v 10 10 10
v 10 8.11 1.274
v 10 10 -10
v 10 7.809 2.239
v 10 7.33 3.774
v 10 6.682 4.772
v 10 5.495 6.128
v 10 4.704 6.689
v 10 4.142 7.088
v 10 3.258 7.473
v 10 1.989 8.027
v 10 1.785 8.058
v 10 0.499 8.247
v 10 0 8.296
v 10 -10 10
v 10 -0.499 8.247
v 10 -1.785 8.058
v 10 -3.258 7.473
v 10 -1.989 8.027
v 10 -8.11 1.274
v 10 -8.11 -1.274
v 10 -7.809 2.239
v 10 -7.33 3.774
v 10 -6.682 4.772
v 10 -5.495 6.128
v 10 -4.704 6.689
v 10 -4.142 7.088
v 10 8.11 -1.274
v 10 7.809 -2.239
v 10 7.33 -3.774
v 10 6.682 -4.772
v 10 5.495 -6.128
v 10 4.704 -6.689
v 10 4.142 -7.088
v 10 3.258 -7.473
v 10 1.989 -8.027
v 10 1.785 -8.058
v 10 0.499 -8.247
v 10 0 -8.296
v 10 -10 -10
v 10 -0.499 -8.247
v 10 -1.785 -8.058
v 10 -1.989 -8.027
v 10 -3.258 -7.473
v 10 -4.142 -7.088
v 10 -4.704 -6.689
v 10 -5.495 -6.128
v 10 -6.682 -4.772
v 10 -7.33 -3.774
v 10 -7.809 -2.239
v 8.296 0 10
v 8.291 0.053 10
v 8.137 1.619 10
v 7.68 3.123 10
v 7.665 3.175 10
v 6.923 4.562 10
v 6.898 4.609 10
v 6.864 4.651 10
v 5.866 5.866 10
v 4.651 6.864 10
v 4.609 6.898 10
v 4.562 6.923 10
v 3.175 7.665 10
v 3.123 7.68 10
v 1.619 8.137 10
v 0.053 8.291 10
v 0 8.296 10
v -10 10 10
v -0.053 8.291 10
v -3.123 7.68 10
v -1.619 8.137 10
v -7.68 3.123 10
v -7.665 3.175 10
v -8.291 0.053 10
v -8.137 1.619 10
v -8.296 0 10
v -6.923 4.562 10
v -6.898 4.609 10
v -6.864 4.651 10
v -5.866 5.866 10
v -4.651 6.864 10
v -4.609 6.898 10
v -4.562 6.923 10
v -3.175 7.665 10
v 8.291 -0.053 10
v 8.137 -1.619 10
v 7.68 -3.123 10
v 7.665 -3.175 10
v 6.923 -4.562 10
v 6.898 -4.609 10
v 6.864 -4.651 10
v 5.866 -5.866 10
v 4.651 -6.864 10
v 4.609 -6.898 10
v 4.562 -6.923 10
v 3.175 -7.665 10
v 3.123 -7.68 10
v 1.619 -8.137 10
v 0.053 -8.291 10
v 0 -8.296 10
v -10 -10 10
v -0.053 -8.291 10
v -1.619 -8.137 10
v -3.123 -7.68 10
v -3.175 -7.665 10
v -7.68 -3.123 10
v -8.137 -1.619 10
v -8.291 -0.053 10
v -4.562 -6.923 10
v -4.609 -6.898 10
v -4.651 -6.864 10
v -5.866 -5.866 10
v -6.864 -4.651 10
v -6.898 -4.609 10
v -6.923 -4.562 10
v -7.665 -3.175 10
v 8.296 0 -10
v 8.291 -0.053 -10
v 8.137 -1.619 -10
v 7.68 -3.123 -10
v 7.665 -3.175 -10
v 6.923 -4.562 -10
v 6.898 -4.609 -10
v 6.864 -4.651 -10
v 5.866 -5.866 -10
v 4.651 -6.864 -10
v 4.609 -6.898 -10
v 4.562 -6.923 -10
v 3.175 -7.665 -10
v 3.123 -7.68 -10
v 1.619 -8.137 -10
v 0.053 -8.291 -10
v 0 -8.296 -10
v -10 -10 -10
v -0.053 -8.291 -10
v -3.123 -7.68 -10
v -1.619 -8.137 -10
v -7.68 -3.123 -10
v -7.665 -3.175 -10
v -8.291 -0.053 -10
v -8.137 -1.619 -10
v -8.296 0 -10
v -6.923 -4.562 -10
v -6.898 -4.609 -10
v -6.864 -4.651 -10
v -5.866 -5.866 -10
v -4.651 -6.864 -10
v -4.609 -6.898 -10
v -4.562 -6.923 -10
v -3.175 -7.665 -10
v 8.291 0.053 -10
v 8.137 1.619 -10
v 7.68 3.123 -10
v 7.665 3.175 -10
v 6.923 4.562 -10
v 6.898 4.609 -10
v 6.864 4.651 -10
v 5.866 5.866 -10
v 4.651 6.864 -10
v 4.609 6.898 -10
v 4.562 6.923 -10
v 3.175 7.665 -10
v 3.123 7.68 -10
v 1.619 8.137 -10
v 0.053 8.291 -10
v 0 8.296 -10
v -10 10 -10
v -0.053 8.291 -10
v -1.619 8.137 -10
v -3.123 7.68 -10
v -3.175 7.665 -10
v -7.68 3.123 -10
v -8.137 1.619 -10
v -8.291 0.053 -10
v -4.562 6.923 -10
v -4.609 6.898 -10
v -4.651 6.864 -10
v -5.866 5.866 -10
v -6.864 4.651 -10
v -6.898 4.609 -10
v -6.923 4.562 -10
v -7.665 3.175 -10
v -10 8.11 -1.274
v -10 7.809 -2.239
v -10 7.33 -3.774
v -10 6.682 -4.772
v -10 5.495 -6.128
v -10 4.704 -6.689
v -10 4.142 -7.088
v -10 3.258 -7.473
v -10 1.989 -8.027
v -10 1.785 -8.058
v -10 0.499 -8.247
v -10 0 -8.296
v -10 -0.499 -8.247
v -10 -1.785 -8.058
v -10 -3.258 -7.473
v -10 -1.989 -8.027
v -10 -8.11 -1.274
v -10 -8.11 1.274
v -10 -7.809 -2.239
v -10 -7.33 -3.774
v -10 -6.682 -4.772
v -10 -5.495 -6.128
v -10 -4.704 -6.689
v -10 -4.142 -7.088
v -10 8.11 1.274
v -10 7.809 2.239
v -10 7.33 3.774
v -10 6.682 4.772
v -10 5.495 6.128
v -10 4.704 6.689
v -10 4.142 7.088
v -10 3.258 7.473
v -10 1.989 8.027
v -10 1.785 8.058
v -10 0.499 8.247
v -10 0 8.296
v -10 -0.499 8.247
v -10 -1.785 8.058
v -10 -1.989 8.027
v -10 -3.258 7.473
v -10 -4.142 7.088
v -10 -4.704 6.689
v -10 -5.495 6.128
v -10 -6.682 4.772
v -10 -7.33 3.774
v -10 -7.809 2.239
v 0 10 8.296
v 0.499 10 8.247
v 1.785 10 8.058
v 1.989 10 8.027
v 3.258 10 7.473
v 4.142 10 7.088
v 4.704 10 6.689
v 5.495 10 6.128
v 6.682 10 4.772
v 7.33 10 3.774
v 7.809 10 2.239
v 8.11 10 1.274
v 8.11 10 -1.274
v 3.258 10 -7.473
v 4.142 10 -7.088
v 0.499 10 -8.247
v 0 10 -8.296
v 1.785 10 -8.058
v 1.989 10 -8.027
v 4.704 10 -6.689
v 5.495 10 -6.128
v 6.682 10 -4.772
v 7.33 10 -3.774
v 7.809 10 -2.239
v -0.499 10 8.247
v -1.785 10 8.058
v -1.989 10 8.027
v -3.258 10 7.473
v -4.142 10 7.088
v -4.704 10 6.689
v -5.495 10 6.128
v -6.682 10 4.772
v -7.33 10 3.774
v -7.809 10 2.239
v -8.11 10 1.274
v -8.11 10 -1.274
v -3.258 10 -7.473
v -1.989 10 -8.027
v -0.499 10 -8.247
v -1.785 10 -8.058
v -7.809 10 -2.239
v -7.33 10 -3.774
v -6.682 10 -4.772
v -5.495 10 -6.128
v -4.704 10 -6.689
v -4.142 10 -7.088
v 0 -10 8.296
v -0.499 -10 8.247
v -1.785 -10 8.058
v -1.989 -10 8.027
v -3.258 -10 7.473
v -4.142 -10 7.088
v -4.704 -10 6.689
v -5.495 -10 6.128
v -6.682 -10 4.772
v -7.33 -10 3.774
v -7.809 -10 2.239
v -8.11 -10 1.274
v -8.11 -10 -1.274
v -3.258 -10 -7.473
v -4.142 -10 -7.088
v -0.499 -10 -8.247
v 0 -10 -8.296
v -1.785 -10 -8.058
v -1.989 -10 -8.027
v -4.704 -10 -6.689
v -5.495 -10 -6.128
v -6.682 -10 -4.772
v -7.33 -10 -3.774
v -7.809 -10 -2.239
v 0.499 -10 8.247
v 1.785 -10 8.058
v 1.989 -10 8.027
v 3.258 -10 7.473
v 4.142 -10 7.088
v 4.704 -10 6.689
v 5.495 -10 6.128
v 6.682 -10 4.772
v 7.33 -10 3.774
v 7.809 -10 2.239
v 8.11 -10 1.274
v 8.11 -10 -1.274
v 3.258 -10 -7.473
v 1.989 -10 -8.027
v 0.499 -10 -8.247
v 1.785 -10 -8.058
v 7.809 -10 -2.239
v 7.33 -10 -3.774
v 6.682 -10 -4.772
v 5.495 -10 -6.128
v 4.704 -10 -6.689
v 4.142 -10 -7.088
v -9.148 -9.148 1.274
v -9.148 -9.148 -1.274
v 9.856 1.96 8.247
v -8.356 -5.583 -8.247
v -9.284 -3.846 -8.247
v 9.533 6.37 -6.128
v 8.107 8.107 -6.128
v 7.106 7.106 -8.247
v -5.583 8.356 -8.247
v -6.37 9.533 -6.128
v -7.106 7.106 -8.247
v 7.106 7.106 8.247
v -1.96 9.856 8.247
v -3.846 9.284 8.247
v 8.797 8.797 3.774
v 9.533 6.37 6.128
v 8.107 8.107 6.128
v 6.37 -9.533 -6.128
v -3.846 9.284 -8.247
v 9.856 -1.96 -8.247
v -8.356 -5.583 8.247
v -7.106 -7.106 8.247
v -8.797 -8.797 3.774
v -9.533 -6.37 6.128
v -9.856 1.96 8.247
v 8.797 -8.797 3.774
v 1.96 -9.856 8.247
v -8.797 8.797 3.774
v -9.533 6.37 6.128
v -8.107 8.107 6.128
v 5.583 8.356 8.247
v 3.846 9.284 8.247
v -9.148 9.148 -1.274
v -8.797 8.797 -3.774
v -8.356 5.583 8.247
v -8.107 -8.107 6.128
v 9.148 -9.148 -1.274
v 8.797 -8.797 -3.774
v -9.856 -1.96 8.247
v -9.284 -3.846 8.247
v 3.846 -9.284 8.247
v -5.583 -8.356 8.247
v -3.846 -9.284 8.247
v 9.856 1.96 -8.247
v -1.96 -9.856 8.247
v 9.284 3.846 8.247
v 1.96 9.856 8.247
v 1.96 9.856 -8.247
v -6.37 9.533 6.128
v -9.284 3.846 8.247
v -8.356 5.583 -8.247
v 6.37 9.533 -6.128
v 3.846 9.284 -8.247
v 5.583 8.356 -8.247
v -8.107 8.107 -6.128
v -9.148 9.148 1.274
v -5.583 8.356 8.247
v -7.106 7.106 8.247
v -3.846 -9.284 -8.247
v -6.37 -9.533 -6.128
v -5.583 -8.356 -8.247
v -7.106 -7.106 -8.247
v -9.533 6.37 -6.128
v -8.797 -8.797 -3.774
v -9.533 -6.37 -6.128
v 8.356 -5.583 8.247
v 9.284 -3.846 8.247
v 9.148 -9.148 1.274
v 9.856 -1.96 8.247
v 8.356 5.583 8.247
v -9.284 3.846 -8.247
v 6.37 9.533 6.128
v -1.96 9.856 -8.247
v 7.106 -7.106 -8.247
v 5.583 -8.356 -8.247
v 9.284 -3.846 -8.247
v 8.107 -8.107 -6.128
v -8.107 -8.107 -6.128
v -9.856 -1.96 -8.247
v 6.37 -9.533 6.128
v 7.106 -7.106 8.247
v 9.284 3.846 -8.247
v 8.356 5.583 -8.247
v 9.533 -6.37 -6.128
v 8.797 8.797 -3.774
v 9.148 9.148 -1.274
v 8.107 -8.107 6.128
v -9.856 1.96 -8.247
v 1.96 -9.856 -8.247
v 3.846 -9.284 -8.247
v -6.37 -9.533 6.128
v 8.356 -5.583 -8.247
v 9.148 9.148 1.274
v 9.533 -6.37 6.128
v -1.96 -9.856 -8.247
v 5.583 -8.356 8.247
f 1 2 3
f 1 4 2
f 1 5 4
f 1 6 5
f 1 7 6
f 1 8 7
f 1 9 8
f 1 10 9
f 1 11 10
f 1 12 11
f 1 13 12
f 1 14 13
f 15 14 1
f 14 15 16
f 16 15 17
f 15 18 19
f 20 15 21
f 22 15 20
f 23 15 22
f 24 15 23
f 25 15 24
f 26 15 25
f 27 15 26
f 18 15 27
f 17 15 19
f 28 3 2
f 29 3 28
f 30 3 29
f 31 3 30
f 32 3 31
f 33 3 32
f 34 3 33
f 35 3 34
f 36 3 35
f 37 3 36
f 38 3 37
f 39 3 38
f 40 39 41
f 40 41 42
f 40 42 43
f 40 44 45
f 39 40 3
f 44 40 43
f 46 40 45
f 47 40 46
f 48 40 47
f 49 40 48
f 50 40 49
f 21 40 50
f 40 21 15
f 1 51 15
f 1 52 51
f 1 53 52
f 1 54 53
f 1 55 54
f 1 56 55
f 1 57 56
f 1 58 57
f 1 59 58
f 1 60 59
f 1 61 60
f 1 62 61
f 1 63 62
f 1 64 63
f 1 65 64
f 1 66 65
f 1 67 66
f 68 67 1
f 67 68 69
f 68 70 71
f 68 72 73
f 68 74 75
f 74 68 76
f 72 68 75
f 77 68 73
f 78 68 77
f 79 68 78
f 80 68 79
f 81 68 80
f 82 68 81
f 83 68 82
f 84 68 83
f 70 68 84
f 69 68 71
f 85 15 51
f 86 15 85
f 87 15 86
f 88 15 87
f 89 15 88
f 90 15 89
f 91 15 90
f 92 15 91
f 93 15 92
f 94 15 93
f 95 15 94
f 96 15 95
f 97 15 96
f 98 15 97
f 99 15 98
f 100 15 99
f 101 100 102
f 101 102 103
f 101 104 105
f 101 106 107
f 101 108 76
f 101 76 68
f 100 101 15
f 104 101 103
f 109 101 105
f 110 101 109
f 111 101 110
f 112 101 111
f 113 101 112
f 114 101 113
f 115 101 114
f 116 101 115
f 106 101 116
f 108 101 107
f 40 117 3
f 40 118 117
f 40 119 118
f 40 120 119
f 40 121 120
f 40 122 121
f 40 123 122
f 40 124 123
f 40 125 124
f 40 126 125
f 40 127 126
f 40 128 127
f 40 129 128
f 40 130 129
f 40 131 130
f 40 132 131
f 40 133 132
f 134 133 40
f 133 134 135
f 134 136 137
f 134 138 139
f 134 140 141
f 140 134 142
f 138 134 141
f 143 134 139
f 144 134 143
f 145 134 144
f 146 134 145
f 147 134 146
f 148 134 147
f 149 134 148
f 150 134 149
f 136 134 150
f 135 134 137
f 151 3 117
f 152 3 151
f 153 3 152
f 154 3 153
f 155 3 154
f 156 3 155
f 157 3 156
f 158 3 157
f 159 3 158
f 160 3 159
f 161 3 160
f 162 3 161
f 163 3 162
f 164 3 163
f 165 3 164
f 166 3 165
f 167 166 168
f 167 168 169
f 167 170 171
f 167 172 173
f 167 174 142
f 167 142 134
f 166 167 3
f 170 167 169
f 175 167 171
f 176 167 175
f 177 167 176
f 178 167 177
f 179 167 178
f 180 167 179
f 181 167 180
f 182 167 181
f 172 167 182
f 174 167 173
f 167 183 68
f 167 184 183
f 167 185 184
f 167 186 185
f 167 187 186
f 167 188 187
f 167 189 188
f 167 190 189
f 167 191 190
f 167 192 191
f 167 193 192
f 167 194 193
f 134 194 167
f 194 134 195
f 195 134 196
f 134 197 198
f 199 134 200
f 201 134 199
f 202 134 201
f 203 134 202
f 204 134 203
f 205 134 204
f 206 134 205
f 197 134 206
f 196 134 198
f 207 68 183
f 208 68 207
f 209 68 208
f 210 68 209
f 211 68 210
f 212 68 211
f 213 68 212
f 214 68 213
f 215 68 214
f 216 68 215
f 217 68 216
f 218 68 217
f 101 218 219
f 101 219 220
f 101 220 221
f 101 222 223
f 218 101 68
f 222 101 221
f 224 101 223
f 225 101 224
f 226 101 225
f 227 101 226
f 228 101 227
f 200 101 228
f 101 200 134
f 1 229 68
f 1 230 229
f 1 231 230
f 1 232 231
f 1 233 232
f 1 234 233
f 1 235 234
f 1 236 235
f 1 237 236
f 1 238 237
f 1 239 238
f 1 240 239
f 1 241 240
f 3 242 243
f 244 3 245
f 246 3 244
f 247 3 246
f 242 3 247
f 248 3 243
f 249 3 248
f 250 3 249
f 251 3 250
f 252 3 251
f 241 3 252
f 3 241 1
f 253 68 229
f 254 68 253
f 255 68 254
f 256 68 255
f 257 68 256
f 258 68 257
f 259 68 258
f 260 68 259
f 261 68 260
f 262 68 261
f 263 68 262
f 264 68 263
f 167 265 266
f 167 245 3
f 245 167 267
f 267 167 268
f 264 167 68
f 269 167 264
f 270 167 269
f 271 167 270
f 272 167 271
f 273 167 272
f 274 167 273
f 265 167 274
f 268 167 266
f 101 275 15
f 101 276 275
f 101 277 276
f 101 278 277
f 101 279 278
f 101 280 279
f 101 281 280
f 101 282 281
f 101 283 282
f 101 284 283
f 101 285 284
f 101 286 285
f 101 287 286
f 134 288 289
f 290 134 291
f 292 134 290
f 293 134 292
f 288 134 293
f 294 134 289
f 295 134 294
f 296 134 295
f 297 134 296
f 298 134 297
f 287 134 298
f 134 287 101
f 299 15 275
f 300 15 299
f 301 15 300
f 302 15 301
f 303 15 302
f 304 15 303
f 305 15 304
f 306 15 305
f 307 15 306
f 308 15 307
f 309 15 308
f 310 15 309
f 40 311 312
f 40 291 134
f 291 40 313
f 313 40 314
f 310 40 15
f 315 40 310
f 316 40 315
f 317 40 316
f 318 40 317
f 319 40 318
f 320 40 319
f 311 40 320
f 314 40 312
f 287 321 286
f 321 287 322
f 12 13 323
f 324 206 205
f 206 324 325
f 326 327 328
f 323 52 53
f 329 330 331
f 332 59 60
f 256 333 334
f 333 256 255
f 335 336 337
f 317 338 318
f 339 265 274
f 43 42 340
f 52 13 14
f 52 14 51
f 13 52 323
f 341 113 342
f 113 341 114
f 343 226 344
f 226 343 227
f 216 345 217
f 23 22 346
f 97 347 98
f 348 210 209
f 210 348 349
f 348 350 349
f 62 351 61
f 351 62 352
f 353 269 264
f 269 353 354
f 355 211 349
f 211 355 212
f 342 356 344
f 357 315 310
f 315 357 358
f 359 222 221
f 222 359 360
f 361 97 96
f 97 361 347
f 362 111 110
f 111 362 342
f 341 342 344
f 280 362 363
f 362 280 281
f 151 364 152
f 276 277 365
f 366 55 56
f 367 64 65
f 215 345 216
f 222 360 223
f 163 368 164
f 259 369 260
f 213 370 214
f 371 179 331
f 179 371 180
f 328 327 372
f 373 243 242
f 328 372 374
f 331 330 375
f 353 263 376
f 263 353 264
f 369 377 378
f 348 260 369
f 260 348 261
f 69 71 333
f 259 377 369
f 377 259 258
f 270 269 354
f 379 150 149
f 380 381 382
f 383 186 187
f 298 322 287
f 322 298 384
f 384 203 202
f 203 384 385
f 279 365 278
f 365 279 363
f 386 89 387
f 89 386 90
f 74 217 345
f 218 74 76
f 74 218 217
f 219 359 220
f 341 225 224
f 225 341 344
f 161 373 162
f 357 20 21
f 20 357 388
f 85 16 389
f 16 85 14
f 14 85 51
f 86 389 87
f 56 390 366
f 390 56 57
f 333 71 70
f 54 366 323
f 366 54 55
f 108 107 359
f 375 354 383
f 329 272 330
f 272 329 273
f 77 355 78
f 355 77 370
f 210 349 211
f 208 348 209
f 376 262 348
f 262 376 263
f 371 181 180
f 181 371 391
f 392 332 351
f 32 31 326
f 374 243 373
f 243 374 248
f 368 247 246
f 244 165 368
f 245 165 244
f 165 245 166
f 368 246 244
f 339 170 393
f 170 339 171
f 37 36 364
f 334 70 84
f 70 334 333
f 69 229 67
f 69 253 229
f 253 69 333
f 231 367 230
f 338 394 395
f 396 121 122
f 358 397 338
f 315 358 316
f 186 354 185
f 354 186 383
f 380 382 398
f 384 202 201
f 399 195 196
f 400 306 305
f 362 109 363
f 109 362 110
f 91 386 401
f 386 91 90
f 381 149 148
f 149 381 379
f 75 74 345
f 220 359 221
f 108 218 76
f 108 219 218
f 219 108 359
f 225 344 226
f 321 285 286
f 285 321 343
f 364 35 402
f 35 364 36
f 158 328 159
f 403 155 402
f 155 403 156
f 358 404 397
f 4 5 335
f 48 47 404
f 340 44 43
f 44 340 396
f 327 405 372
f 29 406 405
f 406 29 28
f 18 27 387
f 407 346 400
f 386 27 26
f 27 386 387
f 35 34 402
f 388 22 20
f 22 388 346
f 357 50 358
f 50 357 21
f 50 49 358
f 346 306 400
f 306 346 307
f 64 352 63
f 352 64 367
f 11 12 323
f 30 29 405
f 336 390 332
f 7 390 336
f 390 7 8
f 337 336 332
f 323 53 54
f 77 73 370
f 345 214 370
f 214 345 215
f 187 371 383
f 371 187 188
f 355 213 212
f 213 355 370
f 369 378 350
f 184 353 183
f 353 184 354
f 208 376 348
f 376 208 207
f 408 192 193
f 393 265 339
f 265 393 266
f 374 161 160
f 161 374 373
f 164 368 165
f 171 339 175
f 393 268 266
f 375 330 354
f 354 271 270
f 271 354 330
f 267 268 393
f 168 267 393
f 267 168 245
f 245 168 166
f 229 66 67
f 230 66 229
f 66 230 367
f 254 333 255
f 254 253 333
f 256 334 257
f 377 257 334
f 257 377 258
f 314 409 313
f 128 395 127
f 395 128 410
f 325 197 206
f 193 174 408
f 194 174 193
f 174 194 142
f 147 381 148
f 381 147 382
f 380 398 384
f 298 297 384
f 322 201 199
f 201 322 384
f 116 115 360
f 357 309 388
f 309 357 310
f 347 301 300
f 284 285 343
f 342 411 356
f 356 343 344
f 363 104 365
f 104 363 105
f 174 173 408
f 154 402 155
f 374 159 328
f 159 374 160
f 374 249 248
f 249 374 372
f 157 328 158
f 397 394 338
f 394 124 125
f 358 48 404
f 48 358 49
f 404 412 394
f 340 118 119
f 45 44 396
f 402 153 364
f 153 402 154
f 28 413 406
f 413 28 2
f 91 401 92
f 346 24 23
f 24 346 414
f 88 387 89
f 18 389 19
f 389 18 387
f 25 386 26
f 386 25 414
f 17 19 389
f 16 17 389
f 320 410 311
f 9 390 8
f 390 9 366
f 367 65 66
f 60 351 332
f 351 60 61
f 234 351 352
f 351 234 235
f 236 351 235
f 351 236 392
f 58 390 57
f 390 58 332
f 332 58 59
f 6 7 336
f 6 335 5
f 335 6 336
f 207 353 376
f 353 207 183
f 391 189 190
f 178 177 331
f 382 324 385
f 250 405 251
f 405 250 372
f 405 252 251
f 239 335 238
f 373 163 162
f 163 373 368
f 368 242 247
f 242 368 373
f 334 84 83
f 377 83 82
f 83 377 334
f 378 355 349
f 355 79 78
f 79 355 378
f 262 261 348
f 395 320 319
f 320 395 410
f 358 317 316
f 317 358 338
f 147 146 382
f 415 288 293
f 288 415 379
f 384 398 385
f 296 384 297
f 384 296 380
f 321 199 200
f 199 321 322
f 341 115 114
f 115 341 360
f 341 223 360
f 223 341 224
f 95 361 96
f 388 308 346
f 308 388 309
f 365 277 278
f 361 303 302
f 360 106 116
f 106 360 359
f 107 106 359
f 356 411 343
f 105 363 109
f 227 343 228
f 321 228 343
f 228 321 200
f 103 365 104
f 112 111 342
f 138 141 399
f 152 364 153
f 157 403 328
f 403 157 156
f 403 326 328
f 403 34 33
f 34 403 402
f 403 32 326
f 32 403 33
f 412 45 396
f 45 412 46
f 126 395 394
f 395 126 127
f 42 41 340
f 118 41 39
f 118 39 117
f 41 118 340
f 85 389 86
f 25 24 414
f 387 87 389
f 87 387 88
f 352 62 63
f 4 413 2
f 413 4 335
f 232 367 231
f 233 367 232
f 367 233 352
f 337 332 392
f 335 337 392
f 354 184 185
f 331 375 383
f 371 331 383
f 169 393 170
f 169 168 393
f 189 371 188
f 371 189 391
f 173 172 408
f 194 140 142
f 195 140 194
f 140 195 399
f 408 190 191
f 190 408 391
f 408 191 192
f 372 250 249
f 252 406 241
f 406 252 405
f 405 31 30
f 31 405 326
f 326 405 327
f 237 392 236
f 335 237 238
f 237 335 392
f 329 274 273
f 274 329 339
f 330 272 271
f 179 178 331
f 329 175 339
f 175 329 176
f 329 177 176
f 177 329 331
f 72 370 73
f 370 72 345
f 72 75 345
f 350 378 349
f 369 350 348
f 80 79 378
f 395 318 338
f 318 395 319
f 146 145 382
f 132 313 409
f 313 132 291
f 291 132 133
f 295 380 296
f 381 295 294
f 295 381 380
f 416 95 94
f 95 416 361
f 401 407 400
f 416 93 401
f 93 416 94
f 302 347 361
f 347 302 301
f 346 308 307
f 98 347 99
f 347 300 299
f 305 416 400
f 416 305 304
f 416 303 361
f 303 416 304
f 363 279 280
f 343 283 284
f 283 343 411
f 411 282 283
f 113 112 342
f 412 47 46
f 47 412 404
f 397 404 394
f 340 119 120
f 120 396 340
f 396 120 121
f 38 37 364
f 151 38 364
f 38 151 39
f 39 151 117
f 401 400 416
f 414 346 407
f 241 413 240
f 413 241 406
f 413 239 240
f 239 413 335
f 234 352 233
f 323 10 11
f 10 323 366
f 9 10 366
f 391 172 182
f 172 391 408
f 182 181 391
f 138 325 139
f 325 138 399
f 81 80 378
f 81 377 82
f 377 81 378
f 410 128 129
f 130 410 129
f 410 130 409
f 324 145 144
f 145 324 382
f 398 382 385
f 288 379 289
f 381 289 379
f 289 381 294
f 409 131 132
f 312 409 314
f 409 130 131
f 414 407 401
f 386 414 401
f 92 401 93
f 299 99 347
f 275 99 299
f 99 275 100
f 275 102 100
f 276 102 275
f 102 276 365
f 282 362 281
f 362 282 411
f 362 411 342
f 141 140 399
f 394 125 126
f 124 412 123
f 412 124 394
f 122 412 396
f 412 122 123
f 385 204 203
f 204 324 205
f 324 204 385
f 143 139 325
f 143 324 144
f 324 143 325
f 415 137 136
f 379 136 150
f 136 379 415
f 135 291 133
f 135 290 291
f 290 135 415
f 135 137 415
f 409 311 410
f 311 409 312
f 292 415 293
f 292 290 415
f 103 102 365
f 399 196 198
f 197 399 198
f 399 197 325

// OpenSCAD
difference() {
    cube([20, 20, 20], center = true);
    sphere(r = 13, $fn = 32);
}
